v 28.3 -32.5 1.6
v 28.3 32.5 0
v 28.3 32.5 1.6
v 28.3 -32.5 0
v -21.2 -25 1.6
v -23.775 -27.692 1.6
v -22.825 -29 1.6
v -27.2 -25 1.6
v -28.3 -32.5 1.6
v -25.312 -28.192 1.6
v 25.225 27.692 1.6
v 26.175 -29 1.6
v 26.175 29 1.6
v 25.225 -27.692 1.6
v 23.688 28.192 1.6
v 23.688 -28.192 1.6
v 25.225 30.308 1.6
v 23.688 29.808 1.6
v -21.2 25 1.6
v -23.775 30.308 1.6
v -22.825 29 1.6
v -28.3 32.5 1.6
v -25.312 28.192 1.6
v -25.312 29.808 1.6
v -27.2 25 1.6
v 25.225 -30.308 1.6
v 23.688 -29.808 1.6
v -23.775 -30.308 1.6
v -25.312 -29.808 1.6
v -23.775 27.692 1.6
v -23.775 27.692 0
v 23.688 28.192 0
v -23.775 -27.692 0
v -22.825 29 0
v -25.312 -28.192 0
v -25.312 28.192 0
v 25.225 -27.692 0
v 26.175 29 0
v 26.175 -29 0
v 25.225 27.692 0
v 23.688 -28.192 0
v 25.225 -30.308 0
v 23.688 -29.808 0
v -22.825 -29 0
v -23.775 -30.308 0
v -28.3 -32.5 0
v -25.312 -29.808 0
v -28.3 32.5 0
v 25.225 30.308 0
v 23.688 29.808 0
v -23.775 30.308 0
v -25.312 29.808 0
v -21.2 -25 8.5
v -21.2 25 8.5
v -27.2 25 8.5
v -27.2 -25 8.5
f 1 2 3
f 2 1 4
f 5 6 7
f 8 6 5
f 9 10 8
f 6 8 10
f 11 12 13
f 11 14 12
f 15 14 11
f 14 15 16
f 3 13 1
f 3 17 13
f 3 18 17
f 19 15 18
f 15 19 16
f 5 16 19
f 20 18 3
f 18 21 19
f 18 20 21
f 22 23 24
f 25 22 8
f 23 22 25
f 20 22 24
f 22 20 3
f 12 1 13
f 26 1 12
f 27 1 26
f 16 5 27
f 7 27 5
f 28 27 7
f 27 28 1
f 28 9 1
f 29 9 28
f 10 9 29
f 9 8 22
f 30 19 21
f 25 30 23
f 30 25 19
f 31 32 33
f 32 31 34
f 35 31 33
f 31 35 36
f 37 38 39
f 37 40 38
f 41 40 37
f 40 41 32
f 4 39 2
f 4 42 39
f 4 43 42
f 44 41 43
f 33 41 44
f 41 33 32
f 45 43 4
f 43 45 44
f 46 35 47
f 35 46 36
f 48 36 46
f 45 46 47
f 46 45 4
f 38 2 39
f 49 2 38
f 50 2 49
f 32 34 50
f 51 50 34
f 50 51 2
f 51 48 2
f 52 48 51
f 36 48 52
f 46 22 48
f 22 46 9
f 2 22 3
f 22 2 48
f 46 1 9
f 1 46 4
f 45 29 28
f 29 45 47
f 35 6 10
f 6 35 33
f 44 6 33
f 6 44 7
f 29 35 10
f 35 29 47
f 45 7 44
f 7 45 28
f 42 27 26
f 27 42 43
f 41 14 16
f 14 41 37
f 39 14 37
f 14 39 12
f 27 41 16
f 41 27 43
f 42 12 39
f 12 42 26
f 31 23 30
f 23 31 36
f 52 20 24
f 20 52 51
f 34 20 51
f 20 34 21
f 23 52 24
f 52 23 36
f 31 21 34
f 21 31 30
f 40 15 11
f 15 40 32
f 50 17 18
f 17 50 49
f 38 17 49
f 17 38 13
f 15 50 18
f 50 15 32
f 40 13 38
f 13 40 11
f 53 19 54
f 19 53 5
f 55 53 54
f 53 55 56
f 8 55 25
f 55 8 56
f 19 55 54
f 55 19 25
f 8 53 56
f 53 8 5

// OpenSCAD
maker_focus_pan_tilt_hat();

module maker_focus_pan_tilt_hat()
{
    board_width = 56.6;
    board_length = 65;
    board_height = 1.6;
    
    mounting_pad_diameter = 6;
    mounting_hole_diameter = 2.75;
    mounting_hole_width_offset_1 = 4.1;
    mounting_hole_width_offset_2 = 3.5;
    mounting_hole_length_offset_1 = 3.5;
    mounting_hole_length_offset_2 = mounting_hole_length_offset_1 + 58; 
    
    header_width = 6;
    header_length = 50;
    header_height = 8.5 - board_height;
    header_length_offset = mounting_hole_length_offset_1 + 29 - (header_length / 2);
    header_width_offset = mounting_hole_width_offset_1 - (header_width / 2);;

    translate([-(board_width / 2), -(board_length / 2), 0])
    union()
    {
        difference()
        {
            union()
            {
                difference()
                {
                    color("blue", 1.0)
                    cube([board_width, board_length, board_height]);

                    translate([mounting_hole_width_offset_1, mounting_hole_length_offset_1, 0])
                    cylinder(board_height * 2, d = mounting_pad_diameter, true);

                    translate([board_width - mounting_hole_width_offset_2, mounting_hole_length_offset_1, 0])
                    cylinder(board_height * 2, d = mounting_pad_diameter, true);

                    translate([mounting_hole_width_offset_1, mounting_hole_length_offset_2, 0])
                    cylinder(board_height * 2, d = mounting_pad_diameter, true);

                    translate([board_width - mounting_hole_width_offset_2, mounting_hole_length_offset_2, 0])
                    cylinder(board_height * 2, d = mounting_pad_diameter, true);
                }
                color("gold", 1.0)
                {
                    translate([mounting_hole_width_offset_1, mounting_hole_length_offset_1, 0])
                    cylinder(board_height, d = mounting_pad_diameter, true);

                    translate([board_width - mounting_hole_width_offset_2, mounting_hole_length_offset_1, 0])
                    cylinder(board_height, d = mounting_pad_diameter, true);

                    translate([mounting_hole_width_offset_1, mounting_hole_length_offset_2, 0])
                    cylinder(board_height, d = mounting_pad_diameter, true);

                    translate([board_width - mounting_hole_width_offset_2, mounting_hole_length_offset_2, 0])
                    cylinder(board_height, d = mounting_pad_diameter, true);
                }
            }
            translate([mounting_hole_width_offset_1, mounting_hole_length_offset_1, 0])
            cylinder(board_height * 2, d = mounting_hole_diameter, true);

            translate([board_width - mounting_hole_width_offset_2, mounting_hole_length_offset_1, 0])
            cylinder(board_height * 2, d = mounting_hole_diameter, true);

            translate([mounting_hole_width_offset_1, mounting_hole_length_offset_2, 0])
            cylinder(board_height * 2, d = mounting_hole_diameter, true);

            translate([board_width - mounting_hole_width_offset_2, mounting_hole_length_offset_2, 0])
            cylinder(board_height * 2, d = mounting_hole_diameter, true);
        }
        
        color("gold", 1.0)
        translate([header_width_offset, header_length_offset, board_height])
        cube([header_width, header_length, header_height]);
    }
}
